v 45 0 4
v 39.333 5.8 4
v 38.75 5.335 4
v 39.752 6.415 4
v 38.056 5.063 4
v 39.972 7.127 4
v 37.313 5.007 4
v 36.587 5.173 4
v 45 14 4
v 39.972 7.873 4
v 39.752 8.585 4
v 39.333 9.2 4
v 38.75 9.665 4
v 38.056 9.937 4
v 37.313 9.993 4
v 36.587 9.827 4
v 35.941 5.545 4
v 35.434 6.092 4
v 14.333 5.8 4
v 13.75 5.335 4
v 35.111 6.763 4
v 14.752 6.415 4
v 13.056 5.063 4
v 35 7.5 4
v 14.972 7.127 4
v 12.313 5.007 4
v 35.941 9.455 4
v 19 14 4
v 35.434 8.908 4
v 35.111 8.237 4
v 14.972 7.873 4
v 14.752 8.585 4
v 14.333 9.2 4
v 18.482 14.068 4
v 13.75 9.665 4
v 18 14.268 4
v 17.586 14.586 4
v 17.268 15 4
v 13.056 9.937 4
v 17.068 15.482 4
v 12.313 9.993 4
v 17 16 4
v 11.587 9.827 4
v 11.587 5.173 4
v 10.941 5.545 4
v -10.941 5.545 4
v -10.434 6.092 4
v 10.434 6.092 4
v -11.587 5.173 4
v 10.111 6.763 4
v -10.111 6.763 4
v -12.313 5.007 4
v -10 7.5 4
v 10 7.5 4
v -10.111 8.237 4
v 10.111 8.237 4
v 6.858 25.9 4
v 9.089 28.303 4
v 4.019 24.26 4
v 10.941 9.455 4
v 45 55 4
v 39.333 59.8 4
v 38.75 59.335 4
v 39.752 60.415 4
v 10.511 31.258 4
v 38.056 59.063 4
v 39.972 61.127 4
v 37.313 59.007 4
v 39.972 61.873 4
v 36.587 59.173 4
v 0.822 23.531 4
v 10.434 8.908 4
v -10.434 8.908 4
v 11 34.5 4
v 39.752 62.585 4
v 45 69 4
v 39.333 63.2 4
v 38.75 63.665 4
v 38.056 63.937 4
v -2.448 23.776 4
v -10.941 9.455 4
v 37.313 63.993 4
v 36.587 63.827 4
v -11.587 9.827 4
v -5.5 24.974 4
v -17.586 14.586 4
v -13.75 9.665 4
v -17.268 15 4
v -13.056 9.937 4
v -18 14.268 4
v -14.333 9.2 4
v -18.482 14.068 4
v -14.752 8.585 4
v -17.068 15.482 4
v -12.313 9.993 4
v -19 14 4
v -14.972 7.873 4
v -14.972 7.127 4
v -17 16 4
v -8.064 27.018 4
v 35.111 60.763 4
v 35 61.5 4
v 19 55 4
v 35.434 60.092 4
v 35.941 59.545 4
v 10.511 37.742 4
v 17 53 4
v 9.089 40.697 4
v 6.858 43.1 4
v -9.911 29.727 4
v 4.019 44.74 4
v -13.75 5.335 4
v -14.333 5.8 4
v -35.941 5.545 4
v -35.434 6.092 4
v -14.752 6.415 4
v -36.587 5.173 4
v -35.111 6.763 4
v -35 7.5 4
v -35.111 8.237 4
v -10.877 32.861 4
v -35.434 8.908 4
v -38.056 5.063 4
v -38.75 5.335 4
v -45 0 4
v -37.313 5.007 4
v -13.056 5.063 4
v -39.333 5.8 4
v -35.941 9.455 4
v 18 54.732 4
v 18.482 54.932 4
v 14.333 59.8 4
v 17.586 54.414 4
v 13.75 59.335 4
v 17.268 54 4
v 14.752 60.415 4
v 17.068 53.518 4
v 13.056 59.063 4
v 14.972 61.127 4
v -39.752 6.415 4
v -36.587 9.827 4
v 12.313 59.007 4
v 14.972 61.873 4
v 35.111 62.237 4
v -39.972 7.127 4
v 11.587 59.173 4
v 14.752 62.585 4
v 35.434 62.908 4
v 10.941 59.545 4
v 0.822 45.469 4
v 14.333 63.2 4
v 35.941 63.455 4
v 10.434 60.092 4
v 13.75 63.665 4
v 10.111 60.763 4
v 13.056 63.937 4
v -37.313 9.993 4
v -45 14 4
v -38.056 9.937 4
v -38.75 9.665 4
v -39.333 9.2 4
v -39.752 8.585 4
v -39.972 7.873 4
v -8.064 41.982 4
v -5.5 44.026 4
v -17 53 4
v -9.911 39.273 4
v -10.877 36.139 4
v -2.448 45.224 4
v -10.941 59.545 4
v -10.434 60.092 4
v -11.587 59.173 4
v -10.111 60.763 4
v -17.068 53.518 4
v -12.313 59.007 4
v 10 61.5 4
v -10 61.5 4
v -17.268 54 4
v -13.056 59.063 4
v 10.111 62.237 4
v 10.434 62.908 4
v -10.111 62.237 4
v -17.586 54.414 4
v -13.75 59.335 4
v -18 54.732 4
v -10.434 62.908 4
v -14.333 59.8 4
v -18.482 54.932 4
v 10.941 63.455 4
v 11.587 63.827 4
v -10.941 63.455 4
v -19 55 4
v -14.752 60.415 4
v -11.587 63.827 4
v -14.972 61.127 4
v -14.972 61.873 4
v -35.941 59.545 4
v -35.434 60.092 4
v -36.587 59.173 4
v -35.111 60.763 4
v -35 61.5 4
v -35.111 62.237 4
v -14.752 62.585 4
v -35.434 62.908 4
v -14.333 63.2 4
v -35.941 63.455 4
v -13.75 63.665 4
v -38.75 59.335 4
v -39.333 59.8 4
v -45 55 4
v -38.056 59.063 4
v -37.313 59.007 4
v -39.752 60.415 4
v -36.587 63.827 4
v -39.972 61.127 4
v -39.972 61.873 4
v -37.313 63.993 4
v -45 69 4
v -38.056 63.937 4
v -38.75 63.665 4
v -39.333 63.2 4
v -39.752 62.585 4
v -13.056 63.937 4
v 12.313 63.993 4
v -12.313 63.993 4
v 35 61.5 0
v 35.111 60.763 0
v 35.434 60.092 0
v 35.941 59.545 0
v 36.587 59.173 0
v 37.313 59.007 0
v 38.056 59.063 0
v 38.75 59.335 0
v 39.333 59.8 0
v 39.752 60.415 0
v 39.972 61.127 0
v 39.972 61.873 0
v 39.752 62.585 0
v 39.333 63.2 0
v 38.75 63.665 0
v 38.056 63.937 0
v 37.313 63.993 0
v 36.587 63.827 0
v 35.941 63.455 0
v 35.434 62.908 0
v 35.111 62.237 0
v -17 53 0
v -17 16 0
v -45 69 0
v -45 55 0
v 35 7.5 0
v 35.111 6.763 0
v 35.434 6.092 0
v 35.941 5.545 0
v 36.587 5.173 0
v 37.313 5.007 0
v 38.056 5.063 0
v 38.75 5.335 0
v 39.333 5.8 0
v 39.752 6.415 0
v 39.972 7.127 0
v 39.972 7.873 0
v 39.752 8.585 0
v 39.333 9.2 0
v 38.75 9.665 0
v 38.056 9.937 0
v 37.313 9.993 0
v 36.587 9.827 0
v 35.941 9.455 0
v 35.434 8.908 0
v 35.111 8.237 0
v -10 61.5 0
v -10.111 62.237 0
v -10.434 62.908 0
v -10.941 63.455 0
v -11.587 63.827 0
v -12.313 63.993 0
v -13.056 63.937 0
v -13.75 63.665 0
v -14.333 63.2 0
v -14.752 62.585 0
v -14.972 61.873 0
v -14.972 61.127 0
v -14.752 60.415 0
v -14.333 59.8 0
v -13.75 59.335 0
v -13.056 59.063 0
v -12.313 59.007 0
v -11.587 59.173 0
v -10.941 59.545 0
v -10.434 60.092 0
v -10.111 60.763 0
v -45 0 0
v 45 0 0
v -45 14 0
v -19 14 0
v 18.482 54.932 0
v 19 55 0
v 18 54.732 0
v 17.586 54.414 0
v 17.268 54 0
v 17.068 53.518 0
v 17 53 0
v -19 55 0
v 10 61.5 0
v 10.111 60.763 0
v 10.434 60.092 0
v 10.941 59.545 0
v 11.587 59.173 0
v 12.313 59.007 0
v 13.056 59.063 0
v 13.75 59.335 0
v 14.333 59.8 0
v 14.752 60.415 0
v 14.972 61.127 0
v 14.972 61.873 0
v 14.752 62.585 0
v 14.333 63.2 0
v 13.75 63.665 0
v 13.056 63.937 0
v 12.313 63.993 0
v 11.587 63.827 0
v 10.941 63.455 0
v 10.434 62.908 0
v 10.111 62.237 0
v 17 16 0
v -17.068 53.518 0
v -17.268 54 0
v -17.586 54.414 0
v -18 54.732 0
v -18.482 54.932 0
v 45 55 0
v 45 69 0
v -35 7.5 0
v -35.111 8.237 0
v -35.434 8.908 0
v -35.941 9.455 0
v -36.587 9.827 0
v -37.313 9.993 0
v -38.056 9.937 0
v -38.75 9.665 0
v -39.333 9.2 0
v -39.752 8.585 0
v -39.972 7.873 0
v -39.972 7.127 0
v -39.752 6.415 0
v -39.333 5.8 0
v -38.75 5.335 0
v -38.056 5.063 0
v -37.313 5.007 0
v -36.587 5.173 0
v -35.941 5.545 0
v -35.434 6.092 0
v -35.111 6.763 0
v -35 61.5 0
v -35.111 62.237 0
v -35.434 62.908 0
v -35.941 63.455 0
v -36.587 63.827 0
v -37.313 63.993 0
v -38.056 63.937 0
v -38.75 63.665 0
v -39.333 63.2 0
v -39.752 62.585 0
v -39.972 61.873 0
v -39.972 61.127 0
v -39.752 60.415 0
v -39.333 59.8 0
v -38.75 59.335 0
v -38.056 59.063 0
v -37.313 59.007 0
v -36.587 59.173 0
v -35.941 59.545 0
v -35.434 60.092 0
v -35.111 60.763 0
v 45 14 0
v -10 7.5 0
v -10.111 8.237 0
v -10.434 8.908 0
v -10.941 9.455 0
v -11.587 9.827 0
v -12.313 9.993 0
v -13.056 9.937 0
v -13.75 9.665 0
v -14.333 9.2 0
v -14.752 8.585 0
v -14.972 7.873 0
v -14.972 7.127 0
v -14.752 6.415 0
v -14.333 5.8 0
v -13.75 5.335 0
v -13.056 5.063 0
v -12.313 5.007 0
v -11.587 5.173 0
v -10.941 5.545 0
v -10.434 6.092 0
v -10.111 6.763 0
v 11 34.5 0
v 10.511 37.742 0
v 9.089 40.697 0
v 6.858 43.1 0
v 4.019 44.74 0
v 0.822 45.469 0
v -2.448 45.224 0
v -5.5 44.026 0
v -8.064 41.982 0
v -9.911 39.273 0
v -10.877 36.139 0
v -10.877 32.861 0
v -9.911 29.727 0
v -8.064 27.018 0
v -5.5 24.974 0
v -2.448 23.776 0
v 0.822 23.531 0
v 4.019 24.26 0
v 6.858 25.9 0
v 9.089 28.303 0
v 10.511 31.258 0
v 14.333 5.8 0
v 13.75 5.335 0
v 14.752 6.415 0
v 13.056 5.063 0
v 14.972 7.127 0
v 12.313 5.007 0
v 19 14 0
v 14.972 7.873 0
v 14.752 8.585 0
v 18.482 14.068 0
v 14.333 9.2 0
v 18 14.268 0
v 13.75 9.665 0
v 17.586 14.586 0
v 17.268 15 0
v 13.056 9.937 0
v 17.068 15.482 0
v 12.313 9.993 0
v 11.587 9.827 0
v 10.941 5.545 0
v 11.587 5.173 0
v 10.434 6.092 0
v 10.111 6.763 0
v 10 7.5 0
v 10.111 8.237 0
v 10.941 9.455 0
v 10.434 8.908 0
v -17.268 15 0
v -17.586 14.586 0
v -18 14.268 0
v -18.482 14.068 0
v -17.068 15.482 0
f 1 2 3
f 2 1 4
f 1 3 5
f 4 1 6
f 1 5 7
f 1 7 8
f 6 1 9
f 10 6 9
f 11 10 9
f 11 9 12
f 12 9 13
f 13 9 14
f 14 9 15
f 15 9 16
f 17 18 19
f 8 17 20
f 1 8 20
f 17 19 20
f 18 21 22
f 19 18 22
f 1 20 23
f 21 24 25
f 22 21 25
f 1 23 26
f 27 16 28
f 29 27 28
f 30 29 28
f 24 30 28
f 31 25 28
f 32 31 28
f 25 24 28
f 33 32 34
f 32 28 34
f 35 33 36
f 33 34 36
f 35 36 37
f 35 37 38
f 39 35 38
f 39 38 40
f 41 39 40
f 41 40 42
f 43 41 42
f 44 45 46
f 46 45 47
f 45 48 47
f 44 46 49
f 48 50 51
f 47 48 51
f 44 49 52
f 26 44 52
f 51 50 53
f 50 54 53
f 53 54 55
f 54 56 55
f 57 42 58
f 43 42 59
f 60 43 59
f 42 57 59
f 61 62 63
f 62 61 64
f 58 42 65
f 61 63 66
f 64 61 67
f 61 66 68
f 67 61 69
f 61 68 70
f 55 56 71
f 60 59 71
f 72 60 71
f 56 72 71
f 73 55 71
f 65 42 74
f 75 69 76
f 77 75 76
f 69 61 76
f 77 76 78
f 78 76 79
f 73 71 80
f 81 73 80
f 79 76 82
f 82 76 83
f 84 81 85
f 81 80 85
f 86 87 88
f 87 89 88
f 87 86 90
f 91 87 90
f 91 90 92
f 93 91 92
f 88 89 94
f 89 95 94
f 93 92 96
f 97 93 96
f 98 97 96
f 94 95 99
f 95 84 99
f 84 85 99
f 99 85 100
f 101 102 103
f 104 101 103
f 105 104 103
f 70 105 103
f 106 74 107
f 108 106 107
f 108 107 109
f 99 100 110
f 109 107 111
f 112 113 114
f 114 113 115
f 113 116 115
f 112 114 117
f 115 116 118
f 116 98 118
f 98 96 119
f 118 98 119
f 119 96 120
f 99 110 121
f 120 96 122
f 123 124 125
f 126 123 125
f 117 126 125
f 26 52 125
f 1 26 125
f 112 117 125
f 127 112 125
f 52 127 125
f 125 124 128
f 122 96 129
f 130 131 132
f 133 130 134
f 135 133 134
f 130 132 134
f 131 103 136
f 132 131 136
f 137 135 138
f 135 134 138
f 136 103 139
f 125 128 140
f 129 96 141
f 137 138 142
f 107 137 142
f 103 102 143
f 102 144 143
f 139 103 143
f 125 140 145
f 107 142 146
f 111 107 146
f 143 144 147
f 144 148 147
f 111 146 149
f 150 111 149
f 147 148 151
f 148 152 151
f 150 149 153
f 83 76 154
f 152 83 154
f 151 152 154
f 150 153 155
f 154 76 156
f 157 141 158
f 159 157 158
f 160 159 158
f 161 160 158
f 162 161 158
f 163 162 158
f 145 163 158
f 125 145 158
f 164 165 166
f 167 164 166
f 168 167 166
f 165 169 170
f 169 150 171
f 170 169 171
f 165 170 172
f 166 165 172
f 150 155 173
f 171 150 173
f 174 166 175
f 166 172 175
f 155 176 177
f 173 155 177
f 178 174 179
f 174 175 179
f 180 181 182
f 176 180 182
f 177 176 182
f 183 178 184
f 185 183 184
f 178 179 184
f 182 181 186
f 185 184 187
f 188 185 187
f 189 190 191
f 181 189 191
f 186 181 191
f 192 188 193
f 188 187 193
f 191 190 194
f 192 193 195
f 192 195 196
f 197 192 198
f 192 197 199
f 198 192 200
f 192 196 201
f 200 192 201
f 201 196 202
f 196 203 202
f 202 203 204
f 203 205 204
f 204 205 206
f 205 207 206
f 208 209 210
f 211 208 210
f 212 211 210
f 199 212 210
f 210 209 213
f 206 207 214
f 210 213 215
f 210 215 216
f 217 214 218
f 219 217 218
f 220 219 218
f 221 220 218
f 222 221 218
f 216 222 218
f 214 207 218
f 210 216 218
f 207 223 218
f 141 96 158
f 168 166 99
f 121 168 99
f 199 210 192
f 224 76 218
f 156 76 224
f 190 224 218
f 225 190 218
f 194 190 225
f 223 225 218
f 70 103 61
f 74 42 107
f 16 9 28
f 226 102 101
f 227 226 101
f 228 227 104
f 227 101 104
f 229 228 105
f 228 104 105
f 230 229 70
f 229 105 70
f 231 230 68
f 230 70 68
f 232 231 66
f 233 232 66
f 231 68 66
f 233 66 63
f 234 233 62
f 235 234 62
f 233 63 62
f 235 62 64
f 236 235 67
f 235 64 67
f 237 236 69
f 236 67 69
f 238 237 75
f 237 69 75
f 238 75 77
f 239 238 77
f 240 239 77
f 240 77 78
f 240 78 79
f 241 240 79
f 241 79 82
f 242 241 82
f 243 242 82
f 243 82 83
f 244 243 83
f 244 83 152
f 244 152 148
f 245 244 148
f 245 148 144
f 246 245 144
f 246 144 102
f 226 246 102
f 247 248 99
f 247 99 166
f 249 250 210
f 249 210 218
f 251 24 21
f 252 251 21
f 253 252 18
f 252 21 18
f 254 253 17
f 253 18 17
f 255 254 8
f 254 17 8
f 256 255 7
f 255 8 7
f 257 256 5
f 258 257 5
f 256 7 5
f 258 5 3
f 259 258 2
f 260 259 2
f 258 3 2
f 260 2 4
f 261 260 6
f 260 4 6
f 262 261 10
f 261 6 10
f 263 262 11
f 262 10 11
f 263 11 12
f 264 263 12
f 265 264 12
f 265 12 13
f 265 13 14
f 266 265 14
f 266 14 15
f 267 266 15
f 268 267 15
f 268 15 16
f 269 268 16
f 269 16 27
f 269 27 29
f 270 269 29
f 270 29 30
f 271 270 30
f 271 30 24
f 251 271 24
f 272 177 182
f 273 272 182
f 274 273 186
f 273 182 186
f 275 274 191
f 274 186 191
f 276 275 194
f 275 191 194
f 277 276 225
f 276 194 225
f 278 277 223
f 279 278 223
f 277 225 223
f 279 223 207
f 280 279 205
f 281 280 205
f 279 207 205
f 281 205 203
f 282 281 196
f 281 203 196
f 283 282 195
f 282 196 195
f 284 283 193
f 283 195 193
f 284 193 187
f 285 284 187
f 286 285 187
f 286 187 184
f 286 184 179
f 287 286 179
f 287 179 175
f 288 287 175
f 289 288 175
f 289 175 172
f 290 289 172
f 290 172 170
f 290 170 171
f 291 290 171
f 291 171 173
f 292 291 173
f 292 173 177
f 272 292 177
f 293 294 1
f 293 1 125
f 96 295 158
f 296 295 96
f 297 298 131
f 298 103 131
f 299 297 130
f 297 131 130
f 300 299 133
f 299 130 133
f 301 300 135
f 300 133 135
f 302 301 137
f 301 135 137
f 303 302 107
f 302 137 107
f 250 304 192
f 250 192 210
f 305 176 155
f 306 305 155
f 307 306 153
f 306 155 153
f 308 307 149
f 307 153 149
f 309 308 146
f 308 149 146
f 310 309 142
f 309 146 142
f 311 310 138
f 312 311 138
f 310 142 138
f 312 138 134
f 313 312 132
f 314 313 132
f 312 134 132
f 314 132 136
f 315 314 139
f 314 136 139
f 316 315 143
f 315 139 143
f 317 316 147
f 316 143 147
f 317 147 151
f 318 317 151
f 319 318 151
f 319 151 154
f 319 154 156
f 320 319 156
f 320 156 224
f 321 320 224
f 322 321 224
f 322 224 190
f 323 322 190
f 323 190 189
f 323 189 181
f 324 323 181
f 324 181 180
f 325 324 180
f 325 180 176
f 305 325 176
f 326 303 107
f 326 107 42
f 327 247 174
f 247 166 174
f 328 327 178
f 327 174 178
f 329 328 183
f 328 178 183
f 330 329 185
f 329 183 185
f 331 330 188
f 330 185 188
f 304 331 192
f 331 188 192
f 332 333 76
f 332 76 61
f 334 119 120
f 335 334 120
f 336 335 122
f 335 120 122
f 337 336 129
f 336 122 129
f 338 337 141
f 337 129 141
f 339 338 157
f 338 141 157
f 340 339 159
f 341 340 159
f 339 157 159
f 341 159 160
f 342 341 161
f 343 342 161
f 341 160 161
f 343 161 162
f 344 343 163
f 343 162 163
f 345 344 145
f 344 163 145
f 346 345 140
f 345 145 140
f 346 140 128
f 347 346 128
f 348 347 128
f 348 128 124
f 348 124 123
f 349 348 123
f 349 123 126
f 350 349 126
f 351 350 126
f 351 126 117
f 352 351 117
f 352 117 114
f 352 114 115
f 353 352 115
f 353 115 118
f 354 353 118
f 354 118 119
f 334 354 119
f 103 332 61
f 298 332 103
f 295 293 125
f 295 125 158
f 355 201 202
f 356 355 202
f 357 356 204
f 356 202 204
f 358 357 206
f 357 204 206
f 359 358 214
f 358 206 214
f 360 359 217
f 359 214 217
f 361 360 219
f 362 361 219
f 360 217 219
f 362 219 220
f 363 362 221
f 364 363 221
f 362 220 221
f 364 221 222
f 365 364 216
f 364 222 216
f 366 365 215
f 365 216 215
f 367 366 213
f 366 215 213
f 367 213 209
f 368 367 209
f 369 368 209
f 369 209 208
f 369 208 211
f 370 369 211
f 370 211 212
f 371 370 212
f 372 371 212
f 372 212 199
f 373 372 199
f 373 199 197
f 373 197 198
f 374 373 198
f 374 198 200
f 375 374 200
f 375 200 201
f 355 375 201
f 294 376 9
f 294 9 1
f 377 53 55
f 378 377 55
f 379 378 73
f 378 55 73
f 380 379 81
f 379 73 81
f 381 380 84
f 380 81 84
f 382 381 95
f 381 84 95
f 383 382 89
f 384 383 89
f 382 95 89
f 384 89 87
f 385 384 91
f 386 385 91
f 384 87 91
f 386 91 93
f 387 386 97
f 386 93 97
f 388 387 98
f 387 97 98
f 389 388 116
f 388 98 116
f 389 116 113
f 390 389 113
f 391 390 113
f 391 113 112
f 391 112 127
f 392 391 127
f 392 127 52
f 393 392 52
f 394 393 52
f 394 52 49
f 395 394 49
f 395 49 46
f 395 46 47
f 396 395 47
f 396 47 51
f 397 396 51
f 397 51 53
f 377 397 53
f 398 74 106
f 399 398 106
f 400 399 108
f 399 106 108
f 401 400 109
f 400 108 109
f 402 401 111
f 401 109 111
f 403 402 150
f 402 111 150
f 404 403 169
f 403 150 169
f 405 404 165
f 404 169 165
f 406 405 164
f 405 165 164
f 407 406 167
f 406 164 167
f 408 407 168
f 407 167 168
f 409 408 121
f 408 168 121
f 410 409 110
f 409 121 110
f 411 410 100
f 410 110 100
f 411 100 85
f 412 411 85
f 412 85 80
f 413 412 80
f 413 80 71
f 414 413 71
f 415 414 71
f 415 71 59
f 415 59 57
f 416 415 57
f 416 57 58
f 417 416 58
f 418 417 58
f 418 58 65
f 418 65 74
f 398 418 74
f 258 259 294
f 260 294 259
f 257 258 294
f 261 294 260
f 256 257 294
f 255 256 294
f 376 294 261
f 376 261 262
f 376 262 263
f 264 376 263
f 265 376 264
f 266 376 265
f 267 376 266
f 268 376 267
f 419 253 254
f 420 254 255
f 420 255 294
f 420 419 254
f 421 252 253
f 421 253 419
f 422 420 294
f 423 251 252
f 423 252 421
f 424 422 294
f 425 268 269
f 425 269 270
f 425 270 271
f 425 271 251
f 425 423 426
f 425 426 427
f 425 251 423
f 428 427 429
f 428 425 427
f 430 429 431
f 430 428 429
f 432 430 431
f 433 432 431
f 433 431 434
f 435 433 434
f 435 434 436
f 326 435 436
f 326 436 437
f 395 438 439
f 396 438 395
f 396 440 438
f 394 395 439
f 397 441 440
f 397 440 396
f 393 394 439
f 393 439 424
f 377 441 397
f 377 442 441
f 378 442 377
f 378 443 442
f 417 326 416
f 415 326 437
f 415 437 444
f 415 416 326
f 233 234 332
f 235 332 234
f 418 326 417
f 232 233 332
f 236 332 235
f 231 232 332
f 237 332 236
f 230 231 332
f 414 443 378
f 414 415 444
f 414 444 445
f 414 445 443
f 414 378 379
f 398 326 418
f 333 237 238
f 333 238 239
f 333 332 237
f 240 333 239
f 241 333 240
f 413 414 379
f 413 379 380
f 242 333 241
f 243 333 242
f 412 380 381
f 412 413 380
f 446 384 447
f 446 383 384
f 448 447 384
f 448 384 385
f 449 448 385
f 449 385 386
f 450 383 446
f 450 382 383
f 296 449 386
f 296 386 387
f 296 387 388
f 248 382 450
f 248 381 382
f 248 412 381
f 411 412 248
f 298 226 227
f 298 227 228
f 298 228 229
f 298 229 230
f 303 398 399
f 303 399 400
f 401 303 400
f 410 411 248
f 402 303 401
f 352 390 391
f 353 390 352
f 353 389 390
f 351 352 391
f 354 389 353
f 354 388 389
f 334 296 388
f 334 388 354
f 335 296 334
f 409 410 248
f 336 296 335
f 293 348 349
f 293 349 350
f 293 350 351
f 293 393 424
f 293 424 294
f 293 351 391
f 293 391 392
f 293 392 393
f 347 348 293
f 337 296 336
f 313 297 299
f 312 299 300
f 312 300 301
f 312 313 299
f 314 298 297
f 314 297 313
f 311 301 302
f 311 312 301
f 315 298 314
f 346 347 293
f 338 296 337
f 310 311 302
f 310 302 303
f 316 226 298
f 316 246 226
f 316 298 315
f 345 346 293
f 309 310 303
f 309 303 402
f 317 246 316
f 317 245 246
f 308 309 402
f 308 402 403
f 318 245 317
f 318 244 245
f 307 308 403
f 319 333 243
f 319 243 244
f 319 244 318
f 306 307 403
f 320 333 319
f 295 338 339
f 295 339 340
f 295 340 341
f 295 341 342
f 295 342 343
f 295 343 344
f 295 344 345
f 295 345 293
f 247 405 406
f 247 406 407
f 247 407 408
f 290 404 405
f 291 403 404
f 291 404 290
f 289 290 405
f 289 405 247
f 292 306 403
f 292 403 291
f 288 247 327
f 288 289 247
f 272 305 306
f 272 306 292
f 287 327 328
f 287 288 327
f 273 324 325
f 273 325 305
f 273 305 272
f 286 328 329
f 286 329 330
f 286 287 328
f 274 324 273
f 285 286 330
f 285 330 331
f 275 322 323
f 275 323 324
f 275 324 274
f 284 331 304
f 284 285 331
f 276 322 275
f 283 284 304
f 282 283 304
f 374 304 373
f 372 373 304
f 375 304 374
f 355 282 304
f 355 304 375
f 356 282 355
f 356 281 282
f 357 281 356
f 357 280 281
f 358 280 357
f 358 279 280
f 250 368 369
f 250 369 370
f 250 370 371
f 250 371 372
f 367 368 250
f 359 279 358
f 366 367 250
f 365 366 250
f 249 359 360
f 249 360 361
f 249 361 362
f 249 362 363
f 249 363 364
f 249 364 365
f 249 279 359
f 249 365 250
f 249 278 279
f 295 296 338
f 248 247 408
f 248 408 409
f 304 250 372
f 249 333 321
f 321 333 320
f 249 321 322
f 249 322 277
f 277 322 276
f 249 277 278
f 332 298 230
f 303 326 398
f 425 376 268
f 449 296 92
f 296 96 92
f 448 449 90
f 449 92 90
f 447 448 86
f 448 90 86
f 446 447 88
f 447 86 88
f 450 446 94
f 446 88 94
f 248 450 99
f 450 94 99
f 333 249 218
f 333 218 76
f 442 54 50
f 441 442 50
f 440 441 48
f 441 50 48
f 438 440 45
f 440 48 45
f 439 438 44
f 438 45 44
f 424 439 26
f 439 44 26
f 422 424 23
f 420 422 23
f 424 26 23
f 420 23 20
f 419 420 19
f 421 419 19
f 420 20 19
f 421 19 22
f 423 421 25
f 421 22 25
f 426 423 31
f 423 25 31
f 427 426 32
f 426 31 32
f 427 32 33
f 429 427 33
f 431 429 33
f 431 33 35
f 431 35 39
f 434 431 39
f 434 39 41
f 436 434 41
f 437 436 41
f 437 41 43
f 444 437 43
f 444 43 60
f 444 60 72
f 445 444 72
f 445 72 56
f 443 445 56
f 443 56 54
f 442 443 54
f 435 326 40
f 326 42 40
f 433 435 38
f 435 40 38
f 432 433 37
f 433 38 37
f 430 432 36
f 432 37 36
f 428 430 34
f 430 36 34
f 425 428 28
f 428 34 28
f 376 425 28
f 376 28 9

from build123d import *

# Parameters (mm, degrees)
EXTRUDE_1_DEPTH     = 4
FILLET_1_R          = 2
SKETCH_2_R          = 2.5
CUT_EXTRUDE_1_DEPTH = 83.474238402
SKETCH_3_R          = 11
CUT_EXTRUDE_2_DEPTH = 83.474238402


with BuildPart() as part:
    # 草图1 → 凸台-拉伸1 (new body)
    with BuildSketch(Plane.XY):
        Polygon((45, 0), (-45, 0), (-45, 14), (-17, 14), (-17, 55), (-45, 55), (-45, 69), (45, 69), (45, 55), (17, 55), (17, 14), (45, 14), align=None)
    extrude(amount=EXTRUDE_1_DEPTH)

    # 圆角1
    fillet_1_edges = [part.edges().sort_by_distance(p)[0] for p in [
        (-17, 14, 2),
        (-17, 55, 2),
        (17, 55, 2),
        (17, 14, 2),
    ]]
    fillet(fillet_1_edges, radius=FILLET_1_R)

    # 草图2 → 切除-拉伸1 (cut, through all)
    with BuildSketch(Plane.XY.offset(4)):
        with Locations((-37.5, 61.5)):
            Circle(SKETCH_2_R)
        with Locations(Location((37.5, 61.5, 0), (0, 0, 180))):
            Circle(SKETCH_2_R)
        with Locations((-12.5, 61.5)):
            Circle(SKETCH_2_R)
        with Locations(Location((12.5, 61.5, 0), (0, 0, 180))):
            Circle(SKETCH_2_R)
        with Locations((-37.5, 7.5)):
            Circle(SKETCH_2_R)
        with Locations(Location((37.5, 7.5, 0), (0, 0, 180))):
            Circle(SKETCH_2_R)
        with Locations((-12.5, 7.5)):
            Circle(SKETCH_2_R)
        with Locations(Location((12.5, 7.5, 0), (0, 0, 180))):
            Circle(SKETCH_2_R)
    extrude(amount=-CUT_EXTRUDE_1_DEPTH, mode=Mode.SUBTRACT)

    # 草图3 → 切除-拉伸2 (cut, through all)
    with BuildSketch(Plane.XY.offset(4)):
        with Locations((0, 34.5)):
            Circle(SKETCH_3_R)
    extrude(amount=-CUT_EXTRUDE_2_DEPTH, mode=Mode.SUBTRACT)


solid = part.part
